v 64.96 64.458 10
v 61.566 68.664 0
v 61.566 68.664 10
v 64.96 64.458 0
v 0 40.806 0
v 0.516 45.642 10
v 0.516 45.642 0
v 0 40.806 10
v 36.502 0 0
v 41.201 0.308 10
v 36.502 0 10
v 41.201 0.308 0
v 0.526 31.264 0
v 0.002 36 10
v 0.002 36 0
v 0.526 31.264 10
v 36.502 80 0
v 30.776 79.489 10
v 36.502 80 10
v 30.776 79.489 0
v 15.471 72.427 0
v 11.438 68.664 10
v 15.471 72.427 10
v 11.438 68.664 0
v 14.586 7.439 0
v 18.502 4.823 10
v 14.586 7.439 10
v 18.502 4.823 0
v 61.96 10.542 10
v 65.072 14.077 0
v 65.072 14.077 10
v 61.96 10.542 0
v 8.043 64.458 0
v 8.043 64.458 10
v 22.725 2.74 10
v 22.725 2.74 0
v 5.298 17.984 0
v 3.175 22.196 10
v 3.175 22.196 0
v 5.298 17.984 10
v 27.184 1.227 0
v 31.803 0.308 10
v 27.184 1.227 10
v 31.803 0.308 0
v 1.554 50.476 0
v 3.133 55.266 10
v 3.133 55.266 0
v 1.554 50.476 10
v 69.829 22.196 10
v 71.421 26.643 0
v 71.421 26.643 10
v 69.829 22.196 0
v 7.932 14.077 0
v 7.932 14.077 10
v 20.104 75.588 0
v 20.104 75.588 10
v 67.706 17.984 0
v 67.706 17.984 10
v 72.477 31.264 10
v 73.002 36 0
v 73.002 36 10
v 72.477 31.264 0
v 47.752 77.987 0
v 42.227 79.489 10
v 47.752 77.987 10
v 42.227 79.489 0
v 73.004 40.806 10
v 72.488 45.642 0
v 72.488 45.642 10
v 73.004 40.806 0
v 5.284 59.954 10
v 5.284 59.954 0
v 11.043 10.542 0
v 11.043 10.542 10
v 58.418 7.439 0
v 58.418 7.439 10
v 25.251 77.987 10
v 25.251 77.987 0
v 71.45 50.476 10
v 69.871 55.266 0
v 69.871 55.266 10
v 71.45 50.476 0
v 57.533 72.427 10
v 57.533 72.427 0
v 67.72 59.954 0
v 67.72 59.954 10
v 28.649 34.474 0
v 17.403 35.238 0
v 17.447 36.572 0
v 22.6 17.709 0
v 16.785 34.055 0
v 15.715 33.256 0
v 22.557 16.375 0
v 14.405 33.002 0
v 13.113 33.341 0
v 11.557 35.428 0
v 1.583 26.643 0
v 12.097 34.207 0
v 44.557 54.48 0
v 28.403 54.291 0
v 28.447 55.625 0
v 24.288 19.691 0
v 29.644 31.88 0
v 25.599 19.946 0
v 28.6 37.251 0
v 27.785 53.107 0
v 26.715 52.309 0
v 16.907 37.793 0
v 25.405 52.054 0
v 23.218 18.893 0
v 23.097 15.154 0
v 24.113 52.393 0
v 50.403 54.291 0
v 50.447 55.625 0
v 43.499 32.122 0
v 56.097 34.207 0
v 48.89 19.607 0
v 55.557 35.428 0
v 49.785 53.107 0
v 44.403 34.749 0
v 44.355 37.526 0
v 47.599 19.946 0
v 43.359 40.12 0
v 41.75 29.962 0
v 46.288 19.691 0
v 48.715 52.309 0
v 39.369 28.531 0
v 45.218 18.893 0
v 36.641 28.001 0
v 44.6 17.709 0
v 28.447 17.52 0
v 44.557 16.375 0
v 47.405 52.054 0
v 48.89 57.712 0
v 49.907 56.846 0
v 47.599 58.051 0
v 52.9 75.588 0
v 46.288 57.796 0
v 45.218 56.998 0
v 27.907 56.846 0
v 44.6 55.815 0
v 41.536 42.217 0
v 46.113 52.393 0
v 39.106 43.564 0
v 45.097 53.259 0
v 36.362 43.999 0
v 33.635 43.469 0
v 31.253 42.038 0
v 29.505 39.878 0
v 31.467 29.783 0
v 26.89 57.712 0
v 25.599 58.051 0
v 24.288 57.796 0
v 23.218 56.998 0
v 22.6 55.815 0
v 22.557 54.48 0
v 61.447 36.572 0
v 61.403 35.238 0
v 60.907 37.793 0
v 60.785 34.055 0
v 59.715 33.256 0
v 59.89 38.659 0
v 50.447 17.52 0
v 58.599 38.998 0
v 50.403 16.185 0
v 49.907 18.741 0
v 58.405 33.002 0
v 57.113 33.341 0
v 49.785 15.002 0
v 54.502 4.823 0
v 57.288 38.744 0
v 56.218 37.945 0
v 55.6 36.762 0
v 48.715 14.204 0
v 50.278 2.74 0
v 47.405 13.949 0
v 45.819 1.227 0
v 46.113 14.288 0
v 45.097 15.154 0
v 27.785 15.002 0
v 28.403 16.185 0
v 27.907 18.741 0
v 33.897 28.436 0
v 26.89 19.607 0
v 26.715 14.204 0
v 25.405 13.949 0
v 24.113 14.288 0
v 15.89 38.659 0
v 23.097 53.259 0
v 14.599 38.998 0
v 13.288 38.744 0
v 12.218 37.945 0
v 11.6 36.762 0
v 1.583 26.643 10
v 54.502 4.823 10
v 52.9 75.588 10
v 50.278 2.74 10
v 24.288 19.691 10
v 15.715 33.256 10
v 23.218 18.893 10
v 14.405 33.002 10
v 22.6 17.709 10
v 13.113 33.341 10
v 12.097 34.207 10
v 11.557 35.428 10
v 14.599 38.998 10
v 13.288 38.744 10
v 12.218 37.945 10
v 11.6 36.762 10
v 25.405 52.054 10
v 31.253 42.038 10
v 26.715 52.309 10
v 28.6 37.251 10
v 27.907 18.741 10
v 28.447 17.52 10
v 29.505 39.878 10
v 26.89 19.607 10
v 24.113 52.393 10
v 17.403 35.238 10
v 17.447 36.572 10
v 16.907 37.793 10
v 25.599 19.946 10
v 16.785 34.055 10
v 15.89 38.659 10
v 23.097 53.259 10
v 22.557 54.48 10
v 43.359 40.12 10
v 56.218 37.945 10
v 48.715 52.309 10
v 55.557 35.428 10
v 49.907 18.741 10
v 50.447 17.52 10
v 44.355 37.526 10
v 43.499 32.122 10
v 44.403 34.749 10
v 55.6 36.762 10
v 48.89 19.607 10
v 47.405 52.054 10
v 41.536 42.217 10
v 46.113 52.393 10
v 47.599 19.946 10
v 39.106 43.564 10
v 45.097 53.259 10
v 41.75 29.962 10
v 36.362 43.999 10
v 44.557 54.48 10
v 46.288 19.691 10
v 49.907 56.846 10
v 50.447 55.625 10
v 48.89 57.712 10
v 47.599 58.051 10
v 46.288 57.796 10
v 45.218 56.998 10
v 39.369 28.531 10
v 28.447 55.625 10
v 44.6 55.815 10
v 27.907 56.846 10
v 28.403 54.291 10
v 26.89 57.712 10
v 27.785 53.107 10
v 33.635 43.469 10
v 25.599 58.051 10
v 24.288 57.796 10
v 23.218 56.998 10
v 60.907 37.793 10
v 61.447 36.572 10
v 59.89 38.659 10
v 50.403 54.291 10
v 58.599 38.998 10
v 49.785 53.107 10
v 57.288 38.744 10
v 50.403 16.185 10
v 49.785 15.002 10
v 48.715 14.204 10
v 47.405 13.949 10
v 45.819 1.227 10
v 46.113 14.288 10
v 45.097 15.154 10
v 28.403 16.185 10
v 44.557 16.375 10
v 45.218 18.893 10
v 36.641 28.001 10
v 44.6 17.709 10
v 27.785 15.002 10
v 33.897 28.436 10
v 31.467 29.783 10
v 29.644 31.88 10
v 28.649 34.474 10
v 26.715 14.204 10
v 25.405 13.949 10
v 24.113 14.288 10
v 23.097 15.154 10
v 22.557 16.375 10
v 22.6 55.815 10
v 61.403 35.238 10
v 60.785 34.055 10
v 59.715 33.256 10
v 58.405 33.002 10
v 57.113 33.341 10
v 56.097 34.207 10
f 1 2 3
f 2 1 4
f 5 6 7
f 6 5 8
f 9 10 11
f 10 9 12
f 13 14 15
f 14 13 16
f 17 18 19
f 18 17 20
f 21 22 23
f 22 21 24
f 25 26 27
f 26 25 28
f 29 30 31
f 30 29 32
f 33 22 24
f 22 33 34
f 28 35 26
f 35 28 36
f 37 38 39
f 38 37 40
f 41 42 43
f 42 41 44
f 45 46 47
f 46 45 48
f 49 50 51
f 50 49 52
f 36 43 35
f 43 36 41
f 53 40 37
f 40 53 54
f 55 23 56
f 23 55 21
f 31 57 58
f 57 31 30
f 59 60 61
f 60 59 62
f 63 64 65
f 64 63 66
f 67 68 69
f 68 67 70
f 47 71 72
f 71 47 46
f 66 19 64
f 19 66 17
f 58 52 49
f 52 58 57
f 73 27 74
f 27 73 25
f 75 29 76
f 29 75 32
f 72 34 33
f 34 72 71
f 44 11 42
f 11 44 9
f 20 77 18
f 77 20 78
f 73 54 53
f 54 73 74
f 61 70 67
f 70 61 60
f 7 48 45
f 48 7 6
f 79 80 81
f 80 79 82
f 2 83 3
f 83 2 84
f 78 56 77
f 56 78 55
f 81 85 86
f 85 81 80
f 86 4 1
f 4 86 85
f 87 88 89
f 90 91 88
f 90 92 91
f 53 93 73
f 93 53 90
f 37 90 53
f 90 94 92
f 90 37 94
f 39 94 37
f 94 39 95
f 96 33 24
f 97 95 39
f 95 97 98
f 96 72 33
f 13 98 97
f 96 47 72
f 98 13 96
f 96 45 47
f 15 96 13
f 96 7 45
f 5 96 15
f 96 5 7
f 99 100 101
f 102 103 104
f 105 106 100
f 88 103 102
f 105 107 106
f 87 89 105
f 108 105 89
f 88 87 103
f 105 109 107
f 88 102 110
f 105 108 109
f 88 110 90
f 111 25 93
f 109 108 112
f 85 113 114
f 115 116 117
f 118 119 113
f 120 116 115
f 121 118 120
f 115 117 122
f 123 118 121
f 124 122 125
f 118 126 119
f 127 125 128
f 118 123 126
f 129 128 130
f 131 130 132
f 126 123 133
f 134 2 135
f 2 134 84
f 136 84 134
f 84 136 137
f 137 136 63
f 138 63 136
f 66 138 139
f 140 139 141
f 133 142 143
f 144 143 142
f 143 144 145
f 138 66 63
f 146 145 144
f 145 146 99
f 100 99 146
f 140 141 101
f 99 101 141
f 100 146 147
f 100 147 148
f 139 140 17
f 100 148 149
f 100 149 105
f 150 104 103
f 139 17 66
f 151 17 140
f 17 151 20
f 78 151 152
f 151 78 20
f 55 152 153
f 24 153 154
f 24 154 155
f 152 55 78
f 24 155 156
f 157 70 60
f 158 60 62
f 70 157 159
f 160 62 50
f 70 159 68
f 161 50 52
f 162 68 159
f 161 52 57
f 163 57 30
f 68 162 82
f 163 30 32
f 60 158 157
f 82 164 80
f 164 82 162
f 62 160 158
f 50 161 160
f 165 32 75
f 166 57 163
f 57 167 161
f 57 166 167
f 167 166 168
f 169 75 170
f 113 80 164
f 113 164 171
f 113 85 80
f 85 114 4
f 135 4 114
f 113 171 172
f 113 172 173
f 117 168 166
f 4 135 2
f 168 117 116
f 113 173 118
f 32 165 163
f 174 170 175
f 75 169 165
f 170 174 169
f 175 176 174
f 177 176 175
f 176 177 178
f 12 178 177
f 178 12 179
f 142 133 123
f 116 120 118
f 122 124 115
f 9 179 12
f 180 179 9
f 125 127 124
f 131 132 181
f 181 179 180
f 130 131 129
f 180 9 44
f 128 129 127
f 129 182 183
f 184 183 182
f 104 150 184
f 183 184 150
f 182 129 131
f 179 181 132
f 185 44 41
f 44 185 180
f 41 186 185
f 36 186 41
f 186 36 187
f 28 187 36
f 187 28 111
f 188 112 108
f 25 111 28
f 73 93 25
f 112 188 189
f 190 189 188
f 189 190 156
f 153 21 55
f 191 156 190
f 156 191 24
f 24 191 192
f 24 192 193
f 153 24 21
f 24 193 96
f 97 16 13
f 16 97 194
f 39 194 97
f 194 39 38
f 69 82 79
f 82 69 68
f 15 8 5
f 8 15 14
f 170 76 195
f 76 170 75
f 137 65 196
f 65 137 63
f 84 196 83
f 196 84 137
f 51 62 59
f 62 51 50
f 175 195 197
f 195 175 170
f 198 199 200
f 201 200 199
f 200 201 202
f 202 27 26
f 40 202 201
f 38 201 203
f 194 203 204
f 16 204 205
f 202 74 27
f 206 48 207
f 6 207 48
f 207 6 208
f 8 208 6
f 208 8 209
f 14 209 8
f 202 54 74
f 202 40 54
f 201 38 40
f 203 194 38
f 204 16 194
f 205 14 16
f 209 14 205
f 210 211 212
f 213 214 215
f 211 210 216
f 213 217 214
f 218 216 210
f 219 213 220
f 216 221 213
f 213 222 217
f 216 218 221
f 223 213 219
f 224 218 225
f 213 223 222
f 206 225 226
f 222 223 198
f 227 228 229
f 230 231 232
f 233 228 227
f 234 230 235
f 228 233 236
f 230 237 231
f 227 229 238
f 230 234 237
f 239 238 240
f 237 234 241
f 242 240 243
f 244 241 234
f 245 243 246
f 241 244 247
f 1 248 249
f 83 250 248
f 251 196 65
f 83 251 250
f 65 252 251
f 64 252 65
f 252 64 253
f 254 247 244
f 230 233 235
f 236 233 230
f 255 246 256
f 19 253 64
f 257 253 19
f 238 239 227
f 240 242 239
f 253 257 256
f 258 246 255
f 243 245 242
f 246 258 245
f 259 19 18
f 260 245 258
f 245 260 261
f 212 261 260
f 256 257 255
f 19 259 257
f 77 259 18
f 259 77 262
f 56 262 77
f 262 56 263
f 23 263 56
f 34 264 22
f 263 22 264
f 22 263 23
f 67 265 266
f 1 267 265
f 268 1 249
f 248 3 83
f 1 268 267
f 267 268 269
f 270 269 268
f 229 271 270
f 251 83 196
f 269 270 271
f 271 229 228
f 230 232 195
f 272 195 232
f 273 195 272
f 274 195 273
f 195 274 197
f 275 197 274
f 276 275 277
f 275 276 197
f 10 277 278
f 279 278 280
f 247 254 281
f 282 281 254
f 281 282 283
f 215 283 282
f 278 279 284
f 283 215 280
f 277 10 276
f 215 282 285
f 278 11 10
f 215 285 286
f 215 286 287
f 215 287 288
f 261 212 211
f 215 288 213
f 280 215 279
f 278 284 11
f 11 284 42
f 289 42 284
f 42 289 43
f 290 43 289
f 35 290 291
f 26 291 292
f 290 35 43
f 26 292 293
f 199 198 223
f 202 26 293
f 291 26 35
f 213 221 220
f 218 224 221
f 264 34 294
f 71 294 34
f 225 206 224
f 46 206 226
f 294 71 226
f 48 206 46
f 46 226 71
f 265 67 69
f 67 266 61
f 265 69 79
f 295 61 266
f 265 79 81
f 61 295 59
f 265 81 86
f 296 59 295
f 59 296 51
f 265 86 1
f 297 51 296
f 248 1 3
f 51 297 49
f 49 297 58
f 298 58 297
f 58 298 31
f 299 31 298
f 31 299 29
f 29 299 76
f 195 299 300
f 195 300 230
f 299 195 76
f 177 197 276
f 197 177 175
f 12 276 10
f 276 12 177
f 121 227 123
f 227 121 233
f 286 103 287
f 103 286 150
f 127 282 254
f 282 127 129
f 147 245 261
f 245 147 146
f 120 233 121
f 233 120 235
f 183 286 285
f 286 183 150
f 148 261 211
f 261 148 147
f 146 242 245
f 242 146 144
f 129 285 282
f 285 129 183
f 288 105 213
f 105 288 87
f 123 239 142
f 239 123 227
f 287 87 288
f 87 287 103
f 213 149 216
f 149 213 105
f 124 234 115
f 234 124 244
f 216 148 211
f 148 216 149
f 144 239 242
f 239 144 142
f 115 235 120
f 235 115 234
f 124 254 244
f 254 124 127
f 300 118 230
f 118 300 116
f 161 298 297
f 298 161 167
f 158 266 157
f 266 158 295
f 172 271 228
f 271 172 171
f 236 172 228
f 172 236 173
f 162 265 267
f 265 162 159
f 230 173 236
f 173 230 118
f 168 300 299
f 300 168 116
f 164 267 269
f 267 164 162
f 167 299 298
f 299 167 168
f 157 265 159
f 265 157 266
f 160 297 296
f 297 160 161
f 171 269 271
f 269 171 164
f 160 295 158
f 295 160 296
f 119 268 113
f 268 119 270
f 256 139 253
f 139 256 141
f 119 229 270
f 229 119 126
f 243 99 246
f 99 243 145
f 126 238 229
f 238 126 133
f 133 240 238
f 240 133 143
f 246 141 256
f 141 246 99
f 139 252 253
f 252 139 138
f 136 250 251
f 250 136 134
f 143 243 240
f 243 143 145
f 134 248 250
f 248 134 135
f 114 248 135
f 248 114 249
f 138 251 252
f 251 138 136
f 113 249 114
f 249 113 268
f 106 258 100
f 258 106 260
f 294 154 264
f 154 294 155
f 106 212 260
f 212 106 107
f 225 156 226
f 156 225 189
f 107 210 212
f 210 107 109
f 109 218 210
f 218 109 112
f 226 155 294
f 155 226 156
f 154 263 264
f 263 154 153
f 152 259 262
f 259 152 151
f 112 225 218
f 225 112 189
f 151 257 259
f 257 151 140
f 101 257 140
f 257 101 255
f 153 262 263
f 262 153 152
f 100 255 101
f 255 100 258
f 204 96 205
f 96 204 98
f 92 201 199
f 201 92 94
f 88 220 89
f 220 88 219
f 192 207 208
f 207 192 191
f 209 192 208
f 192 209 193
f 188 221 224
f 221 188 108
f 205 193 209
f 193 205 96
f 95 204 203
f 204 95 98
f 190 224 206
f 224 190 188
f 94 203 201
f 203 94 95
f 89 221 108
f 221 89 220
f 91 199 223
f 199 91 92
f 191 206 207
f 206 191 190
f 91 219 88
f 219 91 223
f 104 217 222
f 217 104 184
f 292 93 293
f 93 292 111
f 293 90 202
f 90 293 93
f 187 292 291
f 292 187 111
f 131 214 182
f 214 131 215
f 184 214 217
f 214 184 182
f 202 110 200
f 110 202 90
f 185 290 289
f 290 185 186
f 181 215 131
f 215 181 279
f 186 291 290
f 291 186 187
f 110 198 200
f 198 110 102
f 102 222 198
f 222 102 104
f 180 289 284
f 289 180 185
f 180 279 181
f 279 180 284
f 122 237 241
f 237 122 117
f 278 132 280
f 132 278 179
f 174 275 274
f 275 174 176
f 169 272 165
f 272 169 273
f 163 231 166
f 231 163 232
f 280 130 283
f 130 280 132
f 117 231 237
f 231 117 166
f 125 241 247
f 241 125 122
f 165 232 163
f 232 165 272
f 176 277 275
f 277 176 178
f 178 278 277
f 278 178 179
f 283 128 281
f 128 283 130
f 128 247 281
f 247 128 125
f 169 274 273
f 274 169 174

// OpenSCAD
$fn = 32;

// ----------------------------------------------------------------------
// Cam plate: single_lobe cam, base R36
// ----------------------------------------------------------------------

// --- parameters (mm) ---
base_r = 36;              // base circle radius
lobe_h = 8;               // cam lobe rise
bore_r = 8;               // shaft bore radius
plate_t = 10;             // plate thickness, Z (extrusion height)
ring_r = 22;              // lightening ring radius
bolt_r = 3;               // lightening hole radius

profile = [[73.002, 36], [73.004, 40.806], [72.488, 45.642], [71.45, 50.476], [69.871, 55.266], [67.72, 59.954], [64.96, 64.458], [61.566, 68.664], [57.533, 72.427], [52.9, 75.588], [47.752, 77.987], [42.227, 79.489], [36.502, 80], [30.776, 79.489], [25.251, 77.987], [20.104, 75.588], [15.471, 72.427], [11.438, 68.664], [8.043, 64.458], [5.284, 59.954], [3.133, 55.266], [1.554, 50.476], [0.516, 45.642], [0, 40.806], [0.002, 36], [0.526, 31.264], [1.583, 26.643], [3.175, 22.196], [5.298, 17.984], [7.932, 14.077], [11.043, 10.542], [14.586, 7.439], [18.502, 4.823], [22.725, 2.74], [27.184, 1.227], [31.803, 0.308], [36.502, 0], [41.201, 0.308], [45.819, 1.227], [50.278, 2.74], [54.502, 4.823], [58.418, 7.439], [61.96, 10.542], [65.072, 14.077], [67.706, 17.984], [69.829, 22.196], [71.421, 26.643], [72.477, 31.264]];  // primary outline, 48 points, counter clockwise
void_1 = [[44.355, 37.526], [43.359, 40.12], [41.536, 42.217], [39.106, 43.564], [36.362, 43.999], [33.635, 43.469], [31.253, 42.038], [29.505, 39.878], [28.6, 37.251], [28.649, 34.474], [29.644, 31.88], [31.467, 29.783], [33.897, 28.436], [36.641, 28.001], [39.369, 28.531], [41.75, 29.962], [43.499, 32.122], [44.403, 34.749]];  // shaft bore, 18 points
void_2 = [[61.447, 36.572], [60.907, 37.793], [59.89, 38.659], [58.599, 38.998], [57.288, 38.744], [56.218, 37.945], [55.6, 36.762], [55.557, 35.428], [56.097, 34.207], [57.113, 33.341], [58.405, 33.002], [59.715, 33.256], [60.785, 34.055], [61.403, 35.238]];  // lightening hole 1, 14 points
void_3 = [[50.447, 55.625], [49.907, 56.846], [48.89, 57.712], [47.599, 58.051], [46.288, 57.796], [45.218, 56.998], [44.6, 55.815], [44.557, 54.48], [45.097, 53.259], [46.113, 52.393], [47.405, 52.054], [48.715, 52.309], [49.785, 53.107], [50.403, 54.291]];  // lightening hole 2, 14 points
void_4 = [[28.447, 55.625], [27.907, 56.846], [26.89, 57.712], [25.599, 58.051], [24.288, 57.796], [23.218, 56.998], [22.6, 55.815], [22.557, 54.48], [23.097, 53.259], [24.113, 52.393], [25.405, 52.054], [26.715, 52.309], [27.785, 53.107], [28.403, 54.291]];  // lightening hole 3, 14 points
void_5 = [[17.447, 36.572], [16.907, 37.793], [15.89, 38.659], [14.599, 38.998], [13.288, 38.744], [12.218, 37.945], [11.6, 36.762], [11.557, 35.428], [12.097, 34.207], [13.113, 33.341], [14.405, 33.002], [15.715, 33.256], [16.785, 34.055], [17.403, 35.238]];  // lightening hole 4, 14 points
void_6 = [[28.447, 17.52], [27.907, 18.741], [26.89, 19.607], [25.599, 19.946], [24.288, 19.691], [23.218, 18.893], [22.6, 17.709], [22.557, 16.375], [23.097, 15.154], [24.113, 14.288], [25.405, 13.949], [26.715, 14.204], [27.785, 15.002], [28.403, 16.185]];  // lightening hole 5, 14 points
void_7 = [[50.447, 17.52], [49.907, 18.741], [48.89, 19.607], [47.599, 19.946], [46.288, 19.691], [45.218, 18.893], [44.6, 17.709], [44.557, 16.375], [45.097, 15.154], [46.113, 14.288], [47.405, 13.949], [48.715, 14.204], [49.785, 15.002], [50.403, 16.185]];  // lightening hole 6, 14 points

// --- the one profile operation ---
difference() {
  linear_extrude(height = plate_t) polygon(points = profile);
  translate([0, 0, -1])
    linear_extrude(height = plate_t + 2) polygon(points = void_1);
  translate([0, 0, -1])
    linear_extrude(height = plate_t + 2) polygon(points = void_2);
  translate([0, 0, -1])
    linear_extrude(height = plate_t + 2) polygon(points = void_3);
  translate([0, 0, -1])
    linear_extrude(height = plate_t + 2) polygon(points = void_4);
  translate([0, 0, -1])
    linear_extrude(height = plate_t + 2) polygon(points = void_5);
  translate([0, 0, -1])
    linear_extrude(height = plate_t + 2) polygon(points = void_6);
  translate([0, 0, -1])
    linear_extrude(height = plate_t + 2) polygon(points = void_7);
}
